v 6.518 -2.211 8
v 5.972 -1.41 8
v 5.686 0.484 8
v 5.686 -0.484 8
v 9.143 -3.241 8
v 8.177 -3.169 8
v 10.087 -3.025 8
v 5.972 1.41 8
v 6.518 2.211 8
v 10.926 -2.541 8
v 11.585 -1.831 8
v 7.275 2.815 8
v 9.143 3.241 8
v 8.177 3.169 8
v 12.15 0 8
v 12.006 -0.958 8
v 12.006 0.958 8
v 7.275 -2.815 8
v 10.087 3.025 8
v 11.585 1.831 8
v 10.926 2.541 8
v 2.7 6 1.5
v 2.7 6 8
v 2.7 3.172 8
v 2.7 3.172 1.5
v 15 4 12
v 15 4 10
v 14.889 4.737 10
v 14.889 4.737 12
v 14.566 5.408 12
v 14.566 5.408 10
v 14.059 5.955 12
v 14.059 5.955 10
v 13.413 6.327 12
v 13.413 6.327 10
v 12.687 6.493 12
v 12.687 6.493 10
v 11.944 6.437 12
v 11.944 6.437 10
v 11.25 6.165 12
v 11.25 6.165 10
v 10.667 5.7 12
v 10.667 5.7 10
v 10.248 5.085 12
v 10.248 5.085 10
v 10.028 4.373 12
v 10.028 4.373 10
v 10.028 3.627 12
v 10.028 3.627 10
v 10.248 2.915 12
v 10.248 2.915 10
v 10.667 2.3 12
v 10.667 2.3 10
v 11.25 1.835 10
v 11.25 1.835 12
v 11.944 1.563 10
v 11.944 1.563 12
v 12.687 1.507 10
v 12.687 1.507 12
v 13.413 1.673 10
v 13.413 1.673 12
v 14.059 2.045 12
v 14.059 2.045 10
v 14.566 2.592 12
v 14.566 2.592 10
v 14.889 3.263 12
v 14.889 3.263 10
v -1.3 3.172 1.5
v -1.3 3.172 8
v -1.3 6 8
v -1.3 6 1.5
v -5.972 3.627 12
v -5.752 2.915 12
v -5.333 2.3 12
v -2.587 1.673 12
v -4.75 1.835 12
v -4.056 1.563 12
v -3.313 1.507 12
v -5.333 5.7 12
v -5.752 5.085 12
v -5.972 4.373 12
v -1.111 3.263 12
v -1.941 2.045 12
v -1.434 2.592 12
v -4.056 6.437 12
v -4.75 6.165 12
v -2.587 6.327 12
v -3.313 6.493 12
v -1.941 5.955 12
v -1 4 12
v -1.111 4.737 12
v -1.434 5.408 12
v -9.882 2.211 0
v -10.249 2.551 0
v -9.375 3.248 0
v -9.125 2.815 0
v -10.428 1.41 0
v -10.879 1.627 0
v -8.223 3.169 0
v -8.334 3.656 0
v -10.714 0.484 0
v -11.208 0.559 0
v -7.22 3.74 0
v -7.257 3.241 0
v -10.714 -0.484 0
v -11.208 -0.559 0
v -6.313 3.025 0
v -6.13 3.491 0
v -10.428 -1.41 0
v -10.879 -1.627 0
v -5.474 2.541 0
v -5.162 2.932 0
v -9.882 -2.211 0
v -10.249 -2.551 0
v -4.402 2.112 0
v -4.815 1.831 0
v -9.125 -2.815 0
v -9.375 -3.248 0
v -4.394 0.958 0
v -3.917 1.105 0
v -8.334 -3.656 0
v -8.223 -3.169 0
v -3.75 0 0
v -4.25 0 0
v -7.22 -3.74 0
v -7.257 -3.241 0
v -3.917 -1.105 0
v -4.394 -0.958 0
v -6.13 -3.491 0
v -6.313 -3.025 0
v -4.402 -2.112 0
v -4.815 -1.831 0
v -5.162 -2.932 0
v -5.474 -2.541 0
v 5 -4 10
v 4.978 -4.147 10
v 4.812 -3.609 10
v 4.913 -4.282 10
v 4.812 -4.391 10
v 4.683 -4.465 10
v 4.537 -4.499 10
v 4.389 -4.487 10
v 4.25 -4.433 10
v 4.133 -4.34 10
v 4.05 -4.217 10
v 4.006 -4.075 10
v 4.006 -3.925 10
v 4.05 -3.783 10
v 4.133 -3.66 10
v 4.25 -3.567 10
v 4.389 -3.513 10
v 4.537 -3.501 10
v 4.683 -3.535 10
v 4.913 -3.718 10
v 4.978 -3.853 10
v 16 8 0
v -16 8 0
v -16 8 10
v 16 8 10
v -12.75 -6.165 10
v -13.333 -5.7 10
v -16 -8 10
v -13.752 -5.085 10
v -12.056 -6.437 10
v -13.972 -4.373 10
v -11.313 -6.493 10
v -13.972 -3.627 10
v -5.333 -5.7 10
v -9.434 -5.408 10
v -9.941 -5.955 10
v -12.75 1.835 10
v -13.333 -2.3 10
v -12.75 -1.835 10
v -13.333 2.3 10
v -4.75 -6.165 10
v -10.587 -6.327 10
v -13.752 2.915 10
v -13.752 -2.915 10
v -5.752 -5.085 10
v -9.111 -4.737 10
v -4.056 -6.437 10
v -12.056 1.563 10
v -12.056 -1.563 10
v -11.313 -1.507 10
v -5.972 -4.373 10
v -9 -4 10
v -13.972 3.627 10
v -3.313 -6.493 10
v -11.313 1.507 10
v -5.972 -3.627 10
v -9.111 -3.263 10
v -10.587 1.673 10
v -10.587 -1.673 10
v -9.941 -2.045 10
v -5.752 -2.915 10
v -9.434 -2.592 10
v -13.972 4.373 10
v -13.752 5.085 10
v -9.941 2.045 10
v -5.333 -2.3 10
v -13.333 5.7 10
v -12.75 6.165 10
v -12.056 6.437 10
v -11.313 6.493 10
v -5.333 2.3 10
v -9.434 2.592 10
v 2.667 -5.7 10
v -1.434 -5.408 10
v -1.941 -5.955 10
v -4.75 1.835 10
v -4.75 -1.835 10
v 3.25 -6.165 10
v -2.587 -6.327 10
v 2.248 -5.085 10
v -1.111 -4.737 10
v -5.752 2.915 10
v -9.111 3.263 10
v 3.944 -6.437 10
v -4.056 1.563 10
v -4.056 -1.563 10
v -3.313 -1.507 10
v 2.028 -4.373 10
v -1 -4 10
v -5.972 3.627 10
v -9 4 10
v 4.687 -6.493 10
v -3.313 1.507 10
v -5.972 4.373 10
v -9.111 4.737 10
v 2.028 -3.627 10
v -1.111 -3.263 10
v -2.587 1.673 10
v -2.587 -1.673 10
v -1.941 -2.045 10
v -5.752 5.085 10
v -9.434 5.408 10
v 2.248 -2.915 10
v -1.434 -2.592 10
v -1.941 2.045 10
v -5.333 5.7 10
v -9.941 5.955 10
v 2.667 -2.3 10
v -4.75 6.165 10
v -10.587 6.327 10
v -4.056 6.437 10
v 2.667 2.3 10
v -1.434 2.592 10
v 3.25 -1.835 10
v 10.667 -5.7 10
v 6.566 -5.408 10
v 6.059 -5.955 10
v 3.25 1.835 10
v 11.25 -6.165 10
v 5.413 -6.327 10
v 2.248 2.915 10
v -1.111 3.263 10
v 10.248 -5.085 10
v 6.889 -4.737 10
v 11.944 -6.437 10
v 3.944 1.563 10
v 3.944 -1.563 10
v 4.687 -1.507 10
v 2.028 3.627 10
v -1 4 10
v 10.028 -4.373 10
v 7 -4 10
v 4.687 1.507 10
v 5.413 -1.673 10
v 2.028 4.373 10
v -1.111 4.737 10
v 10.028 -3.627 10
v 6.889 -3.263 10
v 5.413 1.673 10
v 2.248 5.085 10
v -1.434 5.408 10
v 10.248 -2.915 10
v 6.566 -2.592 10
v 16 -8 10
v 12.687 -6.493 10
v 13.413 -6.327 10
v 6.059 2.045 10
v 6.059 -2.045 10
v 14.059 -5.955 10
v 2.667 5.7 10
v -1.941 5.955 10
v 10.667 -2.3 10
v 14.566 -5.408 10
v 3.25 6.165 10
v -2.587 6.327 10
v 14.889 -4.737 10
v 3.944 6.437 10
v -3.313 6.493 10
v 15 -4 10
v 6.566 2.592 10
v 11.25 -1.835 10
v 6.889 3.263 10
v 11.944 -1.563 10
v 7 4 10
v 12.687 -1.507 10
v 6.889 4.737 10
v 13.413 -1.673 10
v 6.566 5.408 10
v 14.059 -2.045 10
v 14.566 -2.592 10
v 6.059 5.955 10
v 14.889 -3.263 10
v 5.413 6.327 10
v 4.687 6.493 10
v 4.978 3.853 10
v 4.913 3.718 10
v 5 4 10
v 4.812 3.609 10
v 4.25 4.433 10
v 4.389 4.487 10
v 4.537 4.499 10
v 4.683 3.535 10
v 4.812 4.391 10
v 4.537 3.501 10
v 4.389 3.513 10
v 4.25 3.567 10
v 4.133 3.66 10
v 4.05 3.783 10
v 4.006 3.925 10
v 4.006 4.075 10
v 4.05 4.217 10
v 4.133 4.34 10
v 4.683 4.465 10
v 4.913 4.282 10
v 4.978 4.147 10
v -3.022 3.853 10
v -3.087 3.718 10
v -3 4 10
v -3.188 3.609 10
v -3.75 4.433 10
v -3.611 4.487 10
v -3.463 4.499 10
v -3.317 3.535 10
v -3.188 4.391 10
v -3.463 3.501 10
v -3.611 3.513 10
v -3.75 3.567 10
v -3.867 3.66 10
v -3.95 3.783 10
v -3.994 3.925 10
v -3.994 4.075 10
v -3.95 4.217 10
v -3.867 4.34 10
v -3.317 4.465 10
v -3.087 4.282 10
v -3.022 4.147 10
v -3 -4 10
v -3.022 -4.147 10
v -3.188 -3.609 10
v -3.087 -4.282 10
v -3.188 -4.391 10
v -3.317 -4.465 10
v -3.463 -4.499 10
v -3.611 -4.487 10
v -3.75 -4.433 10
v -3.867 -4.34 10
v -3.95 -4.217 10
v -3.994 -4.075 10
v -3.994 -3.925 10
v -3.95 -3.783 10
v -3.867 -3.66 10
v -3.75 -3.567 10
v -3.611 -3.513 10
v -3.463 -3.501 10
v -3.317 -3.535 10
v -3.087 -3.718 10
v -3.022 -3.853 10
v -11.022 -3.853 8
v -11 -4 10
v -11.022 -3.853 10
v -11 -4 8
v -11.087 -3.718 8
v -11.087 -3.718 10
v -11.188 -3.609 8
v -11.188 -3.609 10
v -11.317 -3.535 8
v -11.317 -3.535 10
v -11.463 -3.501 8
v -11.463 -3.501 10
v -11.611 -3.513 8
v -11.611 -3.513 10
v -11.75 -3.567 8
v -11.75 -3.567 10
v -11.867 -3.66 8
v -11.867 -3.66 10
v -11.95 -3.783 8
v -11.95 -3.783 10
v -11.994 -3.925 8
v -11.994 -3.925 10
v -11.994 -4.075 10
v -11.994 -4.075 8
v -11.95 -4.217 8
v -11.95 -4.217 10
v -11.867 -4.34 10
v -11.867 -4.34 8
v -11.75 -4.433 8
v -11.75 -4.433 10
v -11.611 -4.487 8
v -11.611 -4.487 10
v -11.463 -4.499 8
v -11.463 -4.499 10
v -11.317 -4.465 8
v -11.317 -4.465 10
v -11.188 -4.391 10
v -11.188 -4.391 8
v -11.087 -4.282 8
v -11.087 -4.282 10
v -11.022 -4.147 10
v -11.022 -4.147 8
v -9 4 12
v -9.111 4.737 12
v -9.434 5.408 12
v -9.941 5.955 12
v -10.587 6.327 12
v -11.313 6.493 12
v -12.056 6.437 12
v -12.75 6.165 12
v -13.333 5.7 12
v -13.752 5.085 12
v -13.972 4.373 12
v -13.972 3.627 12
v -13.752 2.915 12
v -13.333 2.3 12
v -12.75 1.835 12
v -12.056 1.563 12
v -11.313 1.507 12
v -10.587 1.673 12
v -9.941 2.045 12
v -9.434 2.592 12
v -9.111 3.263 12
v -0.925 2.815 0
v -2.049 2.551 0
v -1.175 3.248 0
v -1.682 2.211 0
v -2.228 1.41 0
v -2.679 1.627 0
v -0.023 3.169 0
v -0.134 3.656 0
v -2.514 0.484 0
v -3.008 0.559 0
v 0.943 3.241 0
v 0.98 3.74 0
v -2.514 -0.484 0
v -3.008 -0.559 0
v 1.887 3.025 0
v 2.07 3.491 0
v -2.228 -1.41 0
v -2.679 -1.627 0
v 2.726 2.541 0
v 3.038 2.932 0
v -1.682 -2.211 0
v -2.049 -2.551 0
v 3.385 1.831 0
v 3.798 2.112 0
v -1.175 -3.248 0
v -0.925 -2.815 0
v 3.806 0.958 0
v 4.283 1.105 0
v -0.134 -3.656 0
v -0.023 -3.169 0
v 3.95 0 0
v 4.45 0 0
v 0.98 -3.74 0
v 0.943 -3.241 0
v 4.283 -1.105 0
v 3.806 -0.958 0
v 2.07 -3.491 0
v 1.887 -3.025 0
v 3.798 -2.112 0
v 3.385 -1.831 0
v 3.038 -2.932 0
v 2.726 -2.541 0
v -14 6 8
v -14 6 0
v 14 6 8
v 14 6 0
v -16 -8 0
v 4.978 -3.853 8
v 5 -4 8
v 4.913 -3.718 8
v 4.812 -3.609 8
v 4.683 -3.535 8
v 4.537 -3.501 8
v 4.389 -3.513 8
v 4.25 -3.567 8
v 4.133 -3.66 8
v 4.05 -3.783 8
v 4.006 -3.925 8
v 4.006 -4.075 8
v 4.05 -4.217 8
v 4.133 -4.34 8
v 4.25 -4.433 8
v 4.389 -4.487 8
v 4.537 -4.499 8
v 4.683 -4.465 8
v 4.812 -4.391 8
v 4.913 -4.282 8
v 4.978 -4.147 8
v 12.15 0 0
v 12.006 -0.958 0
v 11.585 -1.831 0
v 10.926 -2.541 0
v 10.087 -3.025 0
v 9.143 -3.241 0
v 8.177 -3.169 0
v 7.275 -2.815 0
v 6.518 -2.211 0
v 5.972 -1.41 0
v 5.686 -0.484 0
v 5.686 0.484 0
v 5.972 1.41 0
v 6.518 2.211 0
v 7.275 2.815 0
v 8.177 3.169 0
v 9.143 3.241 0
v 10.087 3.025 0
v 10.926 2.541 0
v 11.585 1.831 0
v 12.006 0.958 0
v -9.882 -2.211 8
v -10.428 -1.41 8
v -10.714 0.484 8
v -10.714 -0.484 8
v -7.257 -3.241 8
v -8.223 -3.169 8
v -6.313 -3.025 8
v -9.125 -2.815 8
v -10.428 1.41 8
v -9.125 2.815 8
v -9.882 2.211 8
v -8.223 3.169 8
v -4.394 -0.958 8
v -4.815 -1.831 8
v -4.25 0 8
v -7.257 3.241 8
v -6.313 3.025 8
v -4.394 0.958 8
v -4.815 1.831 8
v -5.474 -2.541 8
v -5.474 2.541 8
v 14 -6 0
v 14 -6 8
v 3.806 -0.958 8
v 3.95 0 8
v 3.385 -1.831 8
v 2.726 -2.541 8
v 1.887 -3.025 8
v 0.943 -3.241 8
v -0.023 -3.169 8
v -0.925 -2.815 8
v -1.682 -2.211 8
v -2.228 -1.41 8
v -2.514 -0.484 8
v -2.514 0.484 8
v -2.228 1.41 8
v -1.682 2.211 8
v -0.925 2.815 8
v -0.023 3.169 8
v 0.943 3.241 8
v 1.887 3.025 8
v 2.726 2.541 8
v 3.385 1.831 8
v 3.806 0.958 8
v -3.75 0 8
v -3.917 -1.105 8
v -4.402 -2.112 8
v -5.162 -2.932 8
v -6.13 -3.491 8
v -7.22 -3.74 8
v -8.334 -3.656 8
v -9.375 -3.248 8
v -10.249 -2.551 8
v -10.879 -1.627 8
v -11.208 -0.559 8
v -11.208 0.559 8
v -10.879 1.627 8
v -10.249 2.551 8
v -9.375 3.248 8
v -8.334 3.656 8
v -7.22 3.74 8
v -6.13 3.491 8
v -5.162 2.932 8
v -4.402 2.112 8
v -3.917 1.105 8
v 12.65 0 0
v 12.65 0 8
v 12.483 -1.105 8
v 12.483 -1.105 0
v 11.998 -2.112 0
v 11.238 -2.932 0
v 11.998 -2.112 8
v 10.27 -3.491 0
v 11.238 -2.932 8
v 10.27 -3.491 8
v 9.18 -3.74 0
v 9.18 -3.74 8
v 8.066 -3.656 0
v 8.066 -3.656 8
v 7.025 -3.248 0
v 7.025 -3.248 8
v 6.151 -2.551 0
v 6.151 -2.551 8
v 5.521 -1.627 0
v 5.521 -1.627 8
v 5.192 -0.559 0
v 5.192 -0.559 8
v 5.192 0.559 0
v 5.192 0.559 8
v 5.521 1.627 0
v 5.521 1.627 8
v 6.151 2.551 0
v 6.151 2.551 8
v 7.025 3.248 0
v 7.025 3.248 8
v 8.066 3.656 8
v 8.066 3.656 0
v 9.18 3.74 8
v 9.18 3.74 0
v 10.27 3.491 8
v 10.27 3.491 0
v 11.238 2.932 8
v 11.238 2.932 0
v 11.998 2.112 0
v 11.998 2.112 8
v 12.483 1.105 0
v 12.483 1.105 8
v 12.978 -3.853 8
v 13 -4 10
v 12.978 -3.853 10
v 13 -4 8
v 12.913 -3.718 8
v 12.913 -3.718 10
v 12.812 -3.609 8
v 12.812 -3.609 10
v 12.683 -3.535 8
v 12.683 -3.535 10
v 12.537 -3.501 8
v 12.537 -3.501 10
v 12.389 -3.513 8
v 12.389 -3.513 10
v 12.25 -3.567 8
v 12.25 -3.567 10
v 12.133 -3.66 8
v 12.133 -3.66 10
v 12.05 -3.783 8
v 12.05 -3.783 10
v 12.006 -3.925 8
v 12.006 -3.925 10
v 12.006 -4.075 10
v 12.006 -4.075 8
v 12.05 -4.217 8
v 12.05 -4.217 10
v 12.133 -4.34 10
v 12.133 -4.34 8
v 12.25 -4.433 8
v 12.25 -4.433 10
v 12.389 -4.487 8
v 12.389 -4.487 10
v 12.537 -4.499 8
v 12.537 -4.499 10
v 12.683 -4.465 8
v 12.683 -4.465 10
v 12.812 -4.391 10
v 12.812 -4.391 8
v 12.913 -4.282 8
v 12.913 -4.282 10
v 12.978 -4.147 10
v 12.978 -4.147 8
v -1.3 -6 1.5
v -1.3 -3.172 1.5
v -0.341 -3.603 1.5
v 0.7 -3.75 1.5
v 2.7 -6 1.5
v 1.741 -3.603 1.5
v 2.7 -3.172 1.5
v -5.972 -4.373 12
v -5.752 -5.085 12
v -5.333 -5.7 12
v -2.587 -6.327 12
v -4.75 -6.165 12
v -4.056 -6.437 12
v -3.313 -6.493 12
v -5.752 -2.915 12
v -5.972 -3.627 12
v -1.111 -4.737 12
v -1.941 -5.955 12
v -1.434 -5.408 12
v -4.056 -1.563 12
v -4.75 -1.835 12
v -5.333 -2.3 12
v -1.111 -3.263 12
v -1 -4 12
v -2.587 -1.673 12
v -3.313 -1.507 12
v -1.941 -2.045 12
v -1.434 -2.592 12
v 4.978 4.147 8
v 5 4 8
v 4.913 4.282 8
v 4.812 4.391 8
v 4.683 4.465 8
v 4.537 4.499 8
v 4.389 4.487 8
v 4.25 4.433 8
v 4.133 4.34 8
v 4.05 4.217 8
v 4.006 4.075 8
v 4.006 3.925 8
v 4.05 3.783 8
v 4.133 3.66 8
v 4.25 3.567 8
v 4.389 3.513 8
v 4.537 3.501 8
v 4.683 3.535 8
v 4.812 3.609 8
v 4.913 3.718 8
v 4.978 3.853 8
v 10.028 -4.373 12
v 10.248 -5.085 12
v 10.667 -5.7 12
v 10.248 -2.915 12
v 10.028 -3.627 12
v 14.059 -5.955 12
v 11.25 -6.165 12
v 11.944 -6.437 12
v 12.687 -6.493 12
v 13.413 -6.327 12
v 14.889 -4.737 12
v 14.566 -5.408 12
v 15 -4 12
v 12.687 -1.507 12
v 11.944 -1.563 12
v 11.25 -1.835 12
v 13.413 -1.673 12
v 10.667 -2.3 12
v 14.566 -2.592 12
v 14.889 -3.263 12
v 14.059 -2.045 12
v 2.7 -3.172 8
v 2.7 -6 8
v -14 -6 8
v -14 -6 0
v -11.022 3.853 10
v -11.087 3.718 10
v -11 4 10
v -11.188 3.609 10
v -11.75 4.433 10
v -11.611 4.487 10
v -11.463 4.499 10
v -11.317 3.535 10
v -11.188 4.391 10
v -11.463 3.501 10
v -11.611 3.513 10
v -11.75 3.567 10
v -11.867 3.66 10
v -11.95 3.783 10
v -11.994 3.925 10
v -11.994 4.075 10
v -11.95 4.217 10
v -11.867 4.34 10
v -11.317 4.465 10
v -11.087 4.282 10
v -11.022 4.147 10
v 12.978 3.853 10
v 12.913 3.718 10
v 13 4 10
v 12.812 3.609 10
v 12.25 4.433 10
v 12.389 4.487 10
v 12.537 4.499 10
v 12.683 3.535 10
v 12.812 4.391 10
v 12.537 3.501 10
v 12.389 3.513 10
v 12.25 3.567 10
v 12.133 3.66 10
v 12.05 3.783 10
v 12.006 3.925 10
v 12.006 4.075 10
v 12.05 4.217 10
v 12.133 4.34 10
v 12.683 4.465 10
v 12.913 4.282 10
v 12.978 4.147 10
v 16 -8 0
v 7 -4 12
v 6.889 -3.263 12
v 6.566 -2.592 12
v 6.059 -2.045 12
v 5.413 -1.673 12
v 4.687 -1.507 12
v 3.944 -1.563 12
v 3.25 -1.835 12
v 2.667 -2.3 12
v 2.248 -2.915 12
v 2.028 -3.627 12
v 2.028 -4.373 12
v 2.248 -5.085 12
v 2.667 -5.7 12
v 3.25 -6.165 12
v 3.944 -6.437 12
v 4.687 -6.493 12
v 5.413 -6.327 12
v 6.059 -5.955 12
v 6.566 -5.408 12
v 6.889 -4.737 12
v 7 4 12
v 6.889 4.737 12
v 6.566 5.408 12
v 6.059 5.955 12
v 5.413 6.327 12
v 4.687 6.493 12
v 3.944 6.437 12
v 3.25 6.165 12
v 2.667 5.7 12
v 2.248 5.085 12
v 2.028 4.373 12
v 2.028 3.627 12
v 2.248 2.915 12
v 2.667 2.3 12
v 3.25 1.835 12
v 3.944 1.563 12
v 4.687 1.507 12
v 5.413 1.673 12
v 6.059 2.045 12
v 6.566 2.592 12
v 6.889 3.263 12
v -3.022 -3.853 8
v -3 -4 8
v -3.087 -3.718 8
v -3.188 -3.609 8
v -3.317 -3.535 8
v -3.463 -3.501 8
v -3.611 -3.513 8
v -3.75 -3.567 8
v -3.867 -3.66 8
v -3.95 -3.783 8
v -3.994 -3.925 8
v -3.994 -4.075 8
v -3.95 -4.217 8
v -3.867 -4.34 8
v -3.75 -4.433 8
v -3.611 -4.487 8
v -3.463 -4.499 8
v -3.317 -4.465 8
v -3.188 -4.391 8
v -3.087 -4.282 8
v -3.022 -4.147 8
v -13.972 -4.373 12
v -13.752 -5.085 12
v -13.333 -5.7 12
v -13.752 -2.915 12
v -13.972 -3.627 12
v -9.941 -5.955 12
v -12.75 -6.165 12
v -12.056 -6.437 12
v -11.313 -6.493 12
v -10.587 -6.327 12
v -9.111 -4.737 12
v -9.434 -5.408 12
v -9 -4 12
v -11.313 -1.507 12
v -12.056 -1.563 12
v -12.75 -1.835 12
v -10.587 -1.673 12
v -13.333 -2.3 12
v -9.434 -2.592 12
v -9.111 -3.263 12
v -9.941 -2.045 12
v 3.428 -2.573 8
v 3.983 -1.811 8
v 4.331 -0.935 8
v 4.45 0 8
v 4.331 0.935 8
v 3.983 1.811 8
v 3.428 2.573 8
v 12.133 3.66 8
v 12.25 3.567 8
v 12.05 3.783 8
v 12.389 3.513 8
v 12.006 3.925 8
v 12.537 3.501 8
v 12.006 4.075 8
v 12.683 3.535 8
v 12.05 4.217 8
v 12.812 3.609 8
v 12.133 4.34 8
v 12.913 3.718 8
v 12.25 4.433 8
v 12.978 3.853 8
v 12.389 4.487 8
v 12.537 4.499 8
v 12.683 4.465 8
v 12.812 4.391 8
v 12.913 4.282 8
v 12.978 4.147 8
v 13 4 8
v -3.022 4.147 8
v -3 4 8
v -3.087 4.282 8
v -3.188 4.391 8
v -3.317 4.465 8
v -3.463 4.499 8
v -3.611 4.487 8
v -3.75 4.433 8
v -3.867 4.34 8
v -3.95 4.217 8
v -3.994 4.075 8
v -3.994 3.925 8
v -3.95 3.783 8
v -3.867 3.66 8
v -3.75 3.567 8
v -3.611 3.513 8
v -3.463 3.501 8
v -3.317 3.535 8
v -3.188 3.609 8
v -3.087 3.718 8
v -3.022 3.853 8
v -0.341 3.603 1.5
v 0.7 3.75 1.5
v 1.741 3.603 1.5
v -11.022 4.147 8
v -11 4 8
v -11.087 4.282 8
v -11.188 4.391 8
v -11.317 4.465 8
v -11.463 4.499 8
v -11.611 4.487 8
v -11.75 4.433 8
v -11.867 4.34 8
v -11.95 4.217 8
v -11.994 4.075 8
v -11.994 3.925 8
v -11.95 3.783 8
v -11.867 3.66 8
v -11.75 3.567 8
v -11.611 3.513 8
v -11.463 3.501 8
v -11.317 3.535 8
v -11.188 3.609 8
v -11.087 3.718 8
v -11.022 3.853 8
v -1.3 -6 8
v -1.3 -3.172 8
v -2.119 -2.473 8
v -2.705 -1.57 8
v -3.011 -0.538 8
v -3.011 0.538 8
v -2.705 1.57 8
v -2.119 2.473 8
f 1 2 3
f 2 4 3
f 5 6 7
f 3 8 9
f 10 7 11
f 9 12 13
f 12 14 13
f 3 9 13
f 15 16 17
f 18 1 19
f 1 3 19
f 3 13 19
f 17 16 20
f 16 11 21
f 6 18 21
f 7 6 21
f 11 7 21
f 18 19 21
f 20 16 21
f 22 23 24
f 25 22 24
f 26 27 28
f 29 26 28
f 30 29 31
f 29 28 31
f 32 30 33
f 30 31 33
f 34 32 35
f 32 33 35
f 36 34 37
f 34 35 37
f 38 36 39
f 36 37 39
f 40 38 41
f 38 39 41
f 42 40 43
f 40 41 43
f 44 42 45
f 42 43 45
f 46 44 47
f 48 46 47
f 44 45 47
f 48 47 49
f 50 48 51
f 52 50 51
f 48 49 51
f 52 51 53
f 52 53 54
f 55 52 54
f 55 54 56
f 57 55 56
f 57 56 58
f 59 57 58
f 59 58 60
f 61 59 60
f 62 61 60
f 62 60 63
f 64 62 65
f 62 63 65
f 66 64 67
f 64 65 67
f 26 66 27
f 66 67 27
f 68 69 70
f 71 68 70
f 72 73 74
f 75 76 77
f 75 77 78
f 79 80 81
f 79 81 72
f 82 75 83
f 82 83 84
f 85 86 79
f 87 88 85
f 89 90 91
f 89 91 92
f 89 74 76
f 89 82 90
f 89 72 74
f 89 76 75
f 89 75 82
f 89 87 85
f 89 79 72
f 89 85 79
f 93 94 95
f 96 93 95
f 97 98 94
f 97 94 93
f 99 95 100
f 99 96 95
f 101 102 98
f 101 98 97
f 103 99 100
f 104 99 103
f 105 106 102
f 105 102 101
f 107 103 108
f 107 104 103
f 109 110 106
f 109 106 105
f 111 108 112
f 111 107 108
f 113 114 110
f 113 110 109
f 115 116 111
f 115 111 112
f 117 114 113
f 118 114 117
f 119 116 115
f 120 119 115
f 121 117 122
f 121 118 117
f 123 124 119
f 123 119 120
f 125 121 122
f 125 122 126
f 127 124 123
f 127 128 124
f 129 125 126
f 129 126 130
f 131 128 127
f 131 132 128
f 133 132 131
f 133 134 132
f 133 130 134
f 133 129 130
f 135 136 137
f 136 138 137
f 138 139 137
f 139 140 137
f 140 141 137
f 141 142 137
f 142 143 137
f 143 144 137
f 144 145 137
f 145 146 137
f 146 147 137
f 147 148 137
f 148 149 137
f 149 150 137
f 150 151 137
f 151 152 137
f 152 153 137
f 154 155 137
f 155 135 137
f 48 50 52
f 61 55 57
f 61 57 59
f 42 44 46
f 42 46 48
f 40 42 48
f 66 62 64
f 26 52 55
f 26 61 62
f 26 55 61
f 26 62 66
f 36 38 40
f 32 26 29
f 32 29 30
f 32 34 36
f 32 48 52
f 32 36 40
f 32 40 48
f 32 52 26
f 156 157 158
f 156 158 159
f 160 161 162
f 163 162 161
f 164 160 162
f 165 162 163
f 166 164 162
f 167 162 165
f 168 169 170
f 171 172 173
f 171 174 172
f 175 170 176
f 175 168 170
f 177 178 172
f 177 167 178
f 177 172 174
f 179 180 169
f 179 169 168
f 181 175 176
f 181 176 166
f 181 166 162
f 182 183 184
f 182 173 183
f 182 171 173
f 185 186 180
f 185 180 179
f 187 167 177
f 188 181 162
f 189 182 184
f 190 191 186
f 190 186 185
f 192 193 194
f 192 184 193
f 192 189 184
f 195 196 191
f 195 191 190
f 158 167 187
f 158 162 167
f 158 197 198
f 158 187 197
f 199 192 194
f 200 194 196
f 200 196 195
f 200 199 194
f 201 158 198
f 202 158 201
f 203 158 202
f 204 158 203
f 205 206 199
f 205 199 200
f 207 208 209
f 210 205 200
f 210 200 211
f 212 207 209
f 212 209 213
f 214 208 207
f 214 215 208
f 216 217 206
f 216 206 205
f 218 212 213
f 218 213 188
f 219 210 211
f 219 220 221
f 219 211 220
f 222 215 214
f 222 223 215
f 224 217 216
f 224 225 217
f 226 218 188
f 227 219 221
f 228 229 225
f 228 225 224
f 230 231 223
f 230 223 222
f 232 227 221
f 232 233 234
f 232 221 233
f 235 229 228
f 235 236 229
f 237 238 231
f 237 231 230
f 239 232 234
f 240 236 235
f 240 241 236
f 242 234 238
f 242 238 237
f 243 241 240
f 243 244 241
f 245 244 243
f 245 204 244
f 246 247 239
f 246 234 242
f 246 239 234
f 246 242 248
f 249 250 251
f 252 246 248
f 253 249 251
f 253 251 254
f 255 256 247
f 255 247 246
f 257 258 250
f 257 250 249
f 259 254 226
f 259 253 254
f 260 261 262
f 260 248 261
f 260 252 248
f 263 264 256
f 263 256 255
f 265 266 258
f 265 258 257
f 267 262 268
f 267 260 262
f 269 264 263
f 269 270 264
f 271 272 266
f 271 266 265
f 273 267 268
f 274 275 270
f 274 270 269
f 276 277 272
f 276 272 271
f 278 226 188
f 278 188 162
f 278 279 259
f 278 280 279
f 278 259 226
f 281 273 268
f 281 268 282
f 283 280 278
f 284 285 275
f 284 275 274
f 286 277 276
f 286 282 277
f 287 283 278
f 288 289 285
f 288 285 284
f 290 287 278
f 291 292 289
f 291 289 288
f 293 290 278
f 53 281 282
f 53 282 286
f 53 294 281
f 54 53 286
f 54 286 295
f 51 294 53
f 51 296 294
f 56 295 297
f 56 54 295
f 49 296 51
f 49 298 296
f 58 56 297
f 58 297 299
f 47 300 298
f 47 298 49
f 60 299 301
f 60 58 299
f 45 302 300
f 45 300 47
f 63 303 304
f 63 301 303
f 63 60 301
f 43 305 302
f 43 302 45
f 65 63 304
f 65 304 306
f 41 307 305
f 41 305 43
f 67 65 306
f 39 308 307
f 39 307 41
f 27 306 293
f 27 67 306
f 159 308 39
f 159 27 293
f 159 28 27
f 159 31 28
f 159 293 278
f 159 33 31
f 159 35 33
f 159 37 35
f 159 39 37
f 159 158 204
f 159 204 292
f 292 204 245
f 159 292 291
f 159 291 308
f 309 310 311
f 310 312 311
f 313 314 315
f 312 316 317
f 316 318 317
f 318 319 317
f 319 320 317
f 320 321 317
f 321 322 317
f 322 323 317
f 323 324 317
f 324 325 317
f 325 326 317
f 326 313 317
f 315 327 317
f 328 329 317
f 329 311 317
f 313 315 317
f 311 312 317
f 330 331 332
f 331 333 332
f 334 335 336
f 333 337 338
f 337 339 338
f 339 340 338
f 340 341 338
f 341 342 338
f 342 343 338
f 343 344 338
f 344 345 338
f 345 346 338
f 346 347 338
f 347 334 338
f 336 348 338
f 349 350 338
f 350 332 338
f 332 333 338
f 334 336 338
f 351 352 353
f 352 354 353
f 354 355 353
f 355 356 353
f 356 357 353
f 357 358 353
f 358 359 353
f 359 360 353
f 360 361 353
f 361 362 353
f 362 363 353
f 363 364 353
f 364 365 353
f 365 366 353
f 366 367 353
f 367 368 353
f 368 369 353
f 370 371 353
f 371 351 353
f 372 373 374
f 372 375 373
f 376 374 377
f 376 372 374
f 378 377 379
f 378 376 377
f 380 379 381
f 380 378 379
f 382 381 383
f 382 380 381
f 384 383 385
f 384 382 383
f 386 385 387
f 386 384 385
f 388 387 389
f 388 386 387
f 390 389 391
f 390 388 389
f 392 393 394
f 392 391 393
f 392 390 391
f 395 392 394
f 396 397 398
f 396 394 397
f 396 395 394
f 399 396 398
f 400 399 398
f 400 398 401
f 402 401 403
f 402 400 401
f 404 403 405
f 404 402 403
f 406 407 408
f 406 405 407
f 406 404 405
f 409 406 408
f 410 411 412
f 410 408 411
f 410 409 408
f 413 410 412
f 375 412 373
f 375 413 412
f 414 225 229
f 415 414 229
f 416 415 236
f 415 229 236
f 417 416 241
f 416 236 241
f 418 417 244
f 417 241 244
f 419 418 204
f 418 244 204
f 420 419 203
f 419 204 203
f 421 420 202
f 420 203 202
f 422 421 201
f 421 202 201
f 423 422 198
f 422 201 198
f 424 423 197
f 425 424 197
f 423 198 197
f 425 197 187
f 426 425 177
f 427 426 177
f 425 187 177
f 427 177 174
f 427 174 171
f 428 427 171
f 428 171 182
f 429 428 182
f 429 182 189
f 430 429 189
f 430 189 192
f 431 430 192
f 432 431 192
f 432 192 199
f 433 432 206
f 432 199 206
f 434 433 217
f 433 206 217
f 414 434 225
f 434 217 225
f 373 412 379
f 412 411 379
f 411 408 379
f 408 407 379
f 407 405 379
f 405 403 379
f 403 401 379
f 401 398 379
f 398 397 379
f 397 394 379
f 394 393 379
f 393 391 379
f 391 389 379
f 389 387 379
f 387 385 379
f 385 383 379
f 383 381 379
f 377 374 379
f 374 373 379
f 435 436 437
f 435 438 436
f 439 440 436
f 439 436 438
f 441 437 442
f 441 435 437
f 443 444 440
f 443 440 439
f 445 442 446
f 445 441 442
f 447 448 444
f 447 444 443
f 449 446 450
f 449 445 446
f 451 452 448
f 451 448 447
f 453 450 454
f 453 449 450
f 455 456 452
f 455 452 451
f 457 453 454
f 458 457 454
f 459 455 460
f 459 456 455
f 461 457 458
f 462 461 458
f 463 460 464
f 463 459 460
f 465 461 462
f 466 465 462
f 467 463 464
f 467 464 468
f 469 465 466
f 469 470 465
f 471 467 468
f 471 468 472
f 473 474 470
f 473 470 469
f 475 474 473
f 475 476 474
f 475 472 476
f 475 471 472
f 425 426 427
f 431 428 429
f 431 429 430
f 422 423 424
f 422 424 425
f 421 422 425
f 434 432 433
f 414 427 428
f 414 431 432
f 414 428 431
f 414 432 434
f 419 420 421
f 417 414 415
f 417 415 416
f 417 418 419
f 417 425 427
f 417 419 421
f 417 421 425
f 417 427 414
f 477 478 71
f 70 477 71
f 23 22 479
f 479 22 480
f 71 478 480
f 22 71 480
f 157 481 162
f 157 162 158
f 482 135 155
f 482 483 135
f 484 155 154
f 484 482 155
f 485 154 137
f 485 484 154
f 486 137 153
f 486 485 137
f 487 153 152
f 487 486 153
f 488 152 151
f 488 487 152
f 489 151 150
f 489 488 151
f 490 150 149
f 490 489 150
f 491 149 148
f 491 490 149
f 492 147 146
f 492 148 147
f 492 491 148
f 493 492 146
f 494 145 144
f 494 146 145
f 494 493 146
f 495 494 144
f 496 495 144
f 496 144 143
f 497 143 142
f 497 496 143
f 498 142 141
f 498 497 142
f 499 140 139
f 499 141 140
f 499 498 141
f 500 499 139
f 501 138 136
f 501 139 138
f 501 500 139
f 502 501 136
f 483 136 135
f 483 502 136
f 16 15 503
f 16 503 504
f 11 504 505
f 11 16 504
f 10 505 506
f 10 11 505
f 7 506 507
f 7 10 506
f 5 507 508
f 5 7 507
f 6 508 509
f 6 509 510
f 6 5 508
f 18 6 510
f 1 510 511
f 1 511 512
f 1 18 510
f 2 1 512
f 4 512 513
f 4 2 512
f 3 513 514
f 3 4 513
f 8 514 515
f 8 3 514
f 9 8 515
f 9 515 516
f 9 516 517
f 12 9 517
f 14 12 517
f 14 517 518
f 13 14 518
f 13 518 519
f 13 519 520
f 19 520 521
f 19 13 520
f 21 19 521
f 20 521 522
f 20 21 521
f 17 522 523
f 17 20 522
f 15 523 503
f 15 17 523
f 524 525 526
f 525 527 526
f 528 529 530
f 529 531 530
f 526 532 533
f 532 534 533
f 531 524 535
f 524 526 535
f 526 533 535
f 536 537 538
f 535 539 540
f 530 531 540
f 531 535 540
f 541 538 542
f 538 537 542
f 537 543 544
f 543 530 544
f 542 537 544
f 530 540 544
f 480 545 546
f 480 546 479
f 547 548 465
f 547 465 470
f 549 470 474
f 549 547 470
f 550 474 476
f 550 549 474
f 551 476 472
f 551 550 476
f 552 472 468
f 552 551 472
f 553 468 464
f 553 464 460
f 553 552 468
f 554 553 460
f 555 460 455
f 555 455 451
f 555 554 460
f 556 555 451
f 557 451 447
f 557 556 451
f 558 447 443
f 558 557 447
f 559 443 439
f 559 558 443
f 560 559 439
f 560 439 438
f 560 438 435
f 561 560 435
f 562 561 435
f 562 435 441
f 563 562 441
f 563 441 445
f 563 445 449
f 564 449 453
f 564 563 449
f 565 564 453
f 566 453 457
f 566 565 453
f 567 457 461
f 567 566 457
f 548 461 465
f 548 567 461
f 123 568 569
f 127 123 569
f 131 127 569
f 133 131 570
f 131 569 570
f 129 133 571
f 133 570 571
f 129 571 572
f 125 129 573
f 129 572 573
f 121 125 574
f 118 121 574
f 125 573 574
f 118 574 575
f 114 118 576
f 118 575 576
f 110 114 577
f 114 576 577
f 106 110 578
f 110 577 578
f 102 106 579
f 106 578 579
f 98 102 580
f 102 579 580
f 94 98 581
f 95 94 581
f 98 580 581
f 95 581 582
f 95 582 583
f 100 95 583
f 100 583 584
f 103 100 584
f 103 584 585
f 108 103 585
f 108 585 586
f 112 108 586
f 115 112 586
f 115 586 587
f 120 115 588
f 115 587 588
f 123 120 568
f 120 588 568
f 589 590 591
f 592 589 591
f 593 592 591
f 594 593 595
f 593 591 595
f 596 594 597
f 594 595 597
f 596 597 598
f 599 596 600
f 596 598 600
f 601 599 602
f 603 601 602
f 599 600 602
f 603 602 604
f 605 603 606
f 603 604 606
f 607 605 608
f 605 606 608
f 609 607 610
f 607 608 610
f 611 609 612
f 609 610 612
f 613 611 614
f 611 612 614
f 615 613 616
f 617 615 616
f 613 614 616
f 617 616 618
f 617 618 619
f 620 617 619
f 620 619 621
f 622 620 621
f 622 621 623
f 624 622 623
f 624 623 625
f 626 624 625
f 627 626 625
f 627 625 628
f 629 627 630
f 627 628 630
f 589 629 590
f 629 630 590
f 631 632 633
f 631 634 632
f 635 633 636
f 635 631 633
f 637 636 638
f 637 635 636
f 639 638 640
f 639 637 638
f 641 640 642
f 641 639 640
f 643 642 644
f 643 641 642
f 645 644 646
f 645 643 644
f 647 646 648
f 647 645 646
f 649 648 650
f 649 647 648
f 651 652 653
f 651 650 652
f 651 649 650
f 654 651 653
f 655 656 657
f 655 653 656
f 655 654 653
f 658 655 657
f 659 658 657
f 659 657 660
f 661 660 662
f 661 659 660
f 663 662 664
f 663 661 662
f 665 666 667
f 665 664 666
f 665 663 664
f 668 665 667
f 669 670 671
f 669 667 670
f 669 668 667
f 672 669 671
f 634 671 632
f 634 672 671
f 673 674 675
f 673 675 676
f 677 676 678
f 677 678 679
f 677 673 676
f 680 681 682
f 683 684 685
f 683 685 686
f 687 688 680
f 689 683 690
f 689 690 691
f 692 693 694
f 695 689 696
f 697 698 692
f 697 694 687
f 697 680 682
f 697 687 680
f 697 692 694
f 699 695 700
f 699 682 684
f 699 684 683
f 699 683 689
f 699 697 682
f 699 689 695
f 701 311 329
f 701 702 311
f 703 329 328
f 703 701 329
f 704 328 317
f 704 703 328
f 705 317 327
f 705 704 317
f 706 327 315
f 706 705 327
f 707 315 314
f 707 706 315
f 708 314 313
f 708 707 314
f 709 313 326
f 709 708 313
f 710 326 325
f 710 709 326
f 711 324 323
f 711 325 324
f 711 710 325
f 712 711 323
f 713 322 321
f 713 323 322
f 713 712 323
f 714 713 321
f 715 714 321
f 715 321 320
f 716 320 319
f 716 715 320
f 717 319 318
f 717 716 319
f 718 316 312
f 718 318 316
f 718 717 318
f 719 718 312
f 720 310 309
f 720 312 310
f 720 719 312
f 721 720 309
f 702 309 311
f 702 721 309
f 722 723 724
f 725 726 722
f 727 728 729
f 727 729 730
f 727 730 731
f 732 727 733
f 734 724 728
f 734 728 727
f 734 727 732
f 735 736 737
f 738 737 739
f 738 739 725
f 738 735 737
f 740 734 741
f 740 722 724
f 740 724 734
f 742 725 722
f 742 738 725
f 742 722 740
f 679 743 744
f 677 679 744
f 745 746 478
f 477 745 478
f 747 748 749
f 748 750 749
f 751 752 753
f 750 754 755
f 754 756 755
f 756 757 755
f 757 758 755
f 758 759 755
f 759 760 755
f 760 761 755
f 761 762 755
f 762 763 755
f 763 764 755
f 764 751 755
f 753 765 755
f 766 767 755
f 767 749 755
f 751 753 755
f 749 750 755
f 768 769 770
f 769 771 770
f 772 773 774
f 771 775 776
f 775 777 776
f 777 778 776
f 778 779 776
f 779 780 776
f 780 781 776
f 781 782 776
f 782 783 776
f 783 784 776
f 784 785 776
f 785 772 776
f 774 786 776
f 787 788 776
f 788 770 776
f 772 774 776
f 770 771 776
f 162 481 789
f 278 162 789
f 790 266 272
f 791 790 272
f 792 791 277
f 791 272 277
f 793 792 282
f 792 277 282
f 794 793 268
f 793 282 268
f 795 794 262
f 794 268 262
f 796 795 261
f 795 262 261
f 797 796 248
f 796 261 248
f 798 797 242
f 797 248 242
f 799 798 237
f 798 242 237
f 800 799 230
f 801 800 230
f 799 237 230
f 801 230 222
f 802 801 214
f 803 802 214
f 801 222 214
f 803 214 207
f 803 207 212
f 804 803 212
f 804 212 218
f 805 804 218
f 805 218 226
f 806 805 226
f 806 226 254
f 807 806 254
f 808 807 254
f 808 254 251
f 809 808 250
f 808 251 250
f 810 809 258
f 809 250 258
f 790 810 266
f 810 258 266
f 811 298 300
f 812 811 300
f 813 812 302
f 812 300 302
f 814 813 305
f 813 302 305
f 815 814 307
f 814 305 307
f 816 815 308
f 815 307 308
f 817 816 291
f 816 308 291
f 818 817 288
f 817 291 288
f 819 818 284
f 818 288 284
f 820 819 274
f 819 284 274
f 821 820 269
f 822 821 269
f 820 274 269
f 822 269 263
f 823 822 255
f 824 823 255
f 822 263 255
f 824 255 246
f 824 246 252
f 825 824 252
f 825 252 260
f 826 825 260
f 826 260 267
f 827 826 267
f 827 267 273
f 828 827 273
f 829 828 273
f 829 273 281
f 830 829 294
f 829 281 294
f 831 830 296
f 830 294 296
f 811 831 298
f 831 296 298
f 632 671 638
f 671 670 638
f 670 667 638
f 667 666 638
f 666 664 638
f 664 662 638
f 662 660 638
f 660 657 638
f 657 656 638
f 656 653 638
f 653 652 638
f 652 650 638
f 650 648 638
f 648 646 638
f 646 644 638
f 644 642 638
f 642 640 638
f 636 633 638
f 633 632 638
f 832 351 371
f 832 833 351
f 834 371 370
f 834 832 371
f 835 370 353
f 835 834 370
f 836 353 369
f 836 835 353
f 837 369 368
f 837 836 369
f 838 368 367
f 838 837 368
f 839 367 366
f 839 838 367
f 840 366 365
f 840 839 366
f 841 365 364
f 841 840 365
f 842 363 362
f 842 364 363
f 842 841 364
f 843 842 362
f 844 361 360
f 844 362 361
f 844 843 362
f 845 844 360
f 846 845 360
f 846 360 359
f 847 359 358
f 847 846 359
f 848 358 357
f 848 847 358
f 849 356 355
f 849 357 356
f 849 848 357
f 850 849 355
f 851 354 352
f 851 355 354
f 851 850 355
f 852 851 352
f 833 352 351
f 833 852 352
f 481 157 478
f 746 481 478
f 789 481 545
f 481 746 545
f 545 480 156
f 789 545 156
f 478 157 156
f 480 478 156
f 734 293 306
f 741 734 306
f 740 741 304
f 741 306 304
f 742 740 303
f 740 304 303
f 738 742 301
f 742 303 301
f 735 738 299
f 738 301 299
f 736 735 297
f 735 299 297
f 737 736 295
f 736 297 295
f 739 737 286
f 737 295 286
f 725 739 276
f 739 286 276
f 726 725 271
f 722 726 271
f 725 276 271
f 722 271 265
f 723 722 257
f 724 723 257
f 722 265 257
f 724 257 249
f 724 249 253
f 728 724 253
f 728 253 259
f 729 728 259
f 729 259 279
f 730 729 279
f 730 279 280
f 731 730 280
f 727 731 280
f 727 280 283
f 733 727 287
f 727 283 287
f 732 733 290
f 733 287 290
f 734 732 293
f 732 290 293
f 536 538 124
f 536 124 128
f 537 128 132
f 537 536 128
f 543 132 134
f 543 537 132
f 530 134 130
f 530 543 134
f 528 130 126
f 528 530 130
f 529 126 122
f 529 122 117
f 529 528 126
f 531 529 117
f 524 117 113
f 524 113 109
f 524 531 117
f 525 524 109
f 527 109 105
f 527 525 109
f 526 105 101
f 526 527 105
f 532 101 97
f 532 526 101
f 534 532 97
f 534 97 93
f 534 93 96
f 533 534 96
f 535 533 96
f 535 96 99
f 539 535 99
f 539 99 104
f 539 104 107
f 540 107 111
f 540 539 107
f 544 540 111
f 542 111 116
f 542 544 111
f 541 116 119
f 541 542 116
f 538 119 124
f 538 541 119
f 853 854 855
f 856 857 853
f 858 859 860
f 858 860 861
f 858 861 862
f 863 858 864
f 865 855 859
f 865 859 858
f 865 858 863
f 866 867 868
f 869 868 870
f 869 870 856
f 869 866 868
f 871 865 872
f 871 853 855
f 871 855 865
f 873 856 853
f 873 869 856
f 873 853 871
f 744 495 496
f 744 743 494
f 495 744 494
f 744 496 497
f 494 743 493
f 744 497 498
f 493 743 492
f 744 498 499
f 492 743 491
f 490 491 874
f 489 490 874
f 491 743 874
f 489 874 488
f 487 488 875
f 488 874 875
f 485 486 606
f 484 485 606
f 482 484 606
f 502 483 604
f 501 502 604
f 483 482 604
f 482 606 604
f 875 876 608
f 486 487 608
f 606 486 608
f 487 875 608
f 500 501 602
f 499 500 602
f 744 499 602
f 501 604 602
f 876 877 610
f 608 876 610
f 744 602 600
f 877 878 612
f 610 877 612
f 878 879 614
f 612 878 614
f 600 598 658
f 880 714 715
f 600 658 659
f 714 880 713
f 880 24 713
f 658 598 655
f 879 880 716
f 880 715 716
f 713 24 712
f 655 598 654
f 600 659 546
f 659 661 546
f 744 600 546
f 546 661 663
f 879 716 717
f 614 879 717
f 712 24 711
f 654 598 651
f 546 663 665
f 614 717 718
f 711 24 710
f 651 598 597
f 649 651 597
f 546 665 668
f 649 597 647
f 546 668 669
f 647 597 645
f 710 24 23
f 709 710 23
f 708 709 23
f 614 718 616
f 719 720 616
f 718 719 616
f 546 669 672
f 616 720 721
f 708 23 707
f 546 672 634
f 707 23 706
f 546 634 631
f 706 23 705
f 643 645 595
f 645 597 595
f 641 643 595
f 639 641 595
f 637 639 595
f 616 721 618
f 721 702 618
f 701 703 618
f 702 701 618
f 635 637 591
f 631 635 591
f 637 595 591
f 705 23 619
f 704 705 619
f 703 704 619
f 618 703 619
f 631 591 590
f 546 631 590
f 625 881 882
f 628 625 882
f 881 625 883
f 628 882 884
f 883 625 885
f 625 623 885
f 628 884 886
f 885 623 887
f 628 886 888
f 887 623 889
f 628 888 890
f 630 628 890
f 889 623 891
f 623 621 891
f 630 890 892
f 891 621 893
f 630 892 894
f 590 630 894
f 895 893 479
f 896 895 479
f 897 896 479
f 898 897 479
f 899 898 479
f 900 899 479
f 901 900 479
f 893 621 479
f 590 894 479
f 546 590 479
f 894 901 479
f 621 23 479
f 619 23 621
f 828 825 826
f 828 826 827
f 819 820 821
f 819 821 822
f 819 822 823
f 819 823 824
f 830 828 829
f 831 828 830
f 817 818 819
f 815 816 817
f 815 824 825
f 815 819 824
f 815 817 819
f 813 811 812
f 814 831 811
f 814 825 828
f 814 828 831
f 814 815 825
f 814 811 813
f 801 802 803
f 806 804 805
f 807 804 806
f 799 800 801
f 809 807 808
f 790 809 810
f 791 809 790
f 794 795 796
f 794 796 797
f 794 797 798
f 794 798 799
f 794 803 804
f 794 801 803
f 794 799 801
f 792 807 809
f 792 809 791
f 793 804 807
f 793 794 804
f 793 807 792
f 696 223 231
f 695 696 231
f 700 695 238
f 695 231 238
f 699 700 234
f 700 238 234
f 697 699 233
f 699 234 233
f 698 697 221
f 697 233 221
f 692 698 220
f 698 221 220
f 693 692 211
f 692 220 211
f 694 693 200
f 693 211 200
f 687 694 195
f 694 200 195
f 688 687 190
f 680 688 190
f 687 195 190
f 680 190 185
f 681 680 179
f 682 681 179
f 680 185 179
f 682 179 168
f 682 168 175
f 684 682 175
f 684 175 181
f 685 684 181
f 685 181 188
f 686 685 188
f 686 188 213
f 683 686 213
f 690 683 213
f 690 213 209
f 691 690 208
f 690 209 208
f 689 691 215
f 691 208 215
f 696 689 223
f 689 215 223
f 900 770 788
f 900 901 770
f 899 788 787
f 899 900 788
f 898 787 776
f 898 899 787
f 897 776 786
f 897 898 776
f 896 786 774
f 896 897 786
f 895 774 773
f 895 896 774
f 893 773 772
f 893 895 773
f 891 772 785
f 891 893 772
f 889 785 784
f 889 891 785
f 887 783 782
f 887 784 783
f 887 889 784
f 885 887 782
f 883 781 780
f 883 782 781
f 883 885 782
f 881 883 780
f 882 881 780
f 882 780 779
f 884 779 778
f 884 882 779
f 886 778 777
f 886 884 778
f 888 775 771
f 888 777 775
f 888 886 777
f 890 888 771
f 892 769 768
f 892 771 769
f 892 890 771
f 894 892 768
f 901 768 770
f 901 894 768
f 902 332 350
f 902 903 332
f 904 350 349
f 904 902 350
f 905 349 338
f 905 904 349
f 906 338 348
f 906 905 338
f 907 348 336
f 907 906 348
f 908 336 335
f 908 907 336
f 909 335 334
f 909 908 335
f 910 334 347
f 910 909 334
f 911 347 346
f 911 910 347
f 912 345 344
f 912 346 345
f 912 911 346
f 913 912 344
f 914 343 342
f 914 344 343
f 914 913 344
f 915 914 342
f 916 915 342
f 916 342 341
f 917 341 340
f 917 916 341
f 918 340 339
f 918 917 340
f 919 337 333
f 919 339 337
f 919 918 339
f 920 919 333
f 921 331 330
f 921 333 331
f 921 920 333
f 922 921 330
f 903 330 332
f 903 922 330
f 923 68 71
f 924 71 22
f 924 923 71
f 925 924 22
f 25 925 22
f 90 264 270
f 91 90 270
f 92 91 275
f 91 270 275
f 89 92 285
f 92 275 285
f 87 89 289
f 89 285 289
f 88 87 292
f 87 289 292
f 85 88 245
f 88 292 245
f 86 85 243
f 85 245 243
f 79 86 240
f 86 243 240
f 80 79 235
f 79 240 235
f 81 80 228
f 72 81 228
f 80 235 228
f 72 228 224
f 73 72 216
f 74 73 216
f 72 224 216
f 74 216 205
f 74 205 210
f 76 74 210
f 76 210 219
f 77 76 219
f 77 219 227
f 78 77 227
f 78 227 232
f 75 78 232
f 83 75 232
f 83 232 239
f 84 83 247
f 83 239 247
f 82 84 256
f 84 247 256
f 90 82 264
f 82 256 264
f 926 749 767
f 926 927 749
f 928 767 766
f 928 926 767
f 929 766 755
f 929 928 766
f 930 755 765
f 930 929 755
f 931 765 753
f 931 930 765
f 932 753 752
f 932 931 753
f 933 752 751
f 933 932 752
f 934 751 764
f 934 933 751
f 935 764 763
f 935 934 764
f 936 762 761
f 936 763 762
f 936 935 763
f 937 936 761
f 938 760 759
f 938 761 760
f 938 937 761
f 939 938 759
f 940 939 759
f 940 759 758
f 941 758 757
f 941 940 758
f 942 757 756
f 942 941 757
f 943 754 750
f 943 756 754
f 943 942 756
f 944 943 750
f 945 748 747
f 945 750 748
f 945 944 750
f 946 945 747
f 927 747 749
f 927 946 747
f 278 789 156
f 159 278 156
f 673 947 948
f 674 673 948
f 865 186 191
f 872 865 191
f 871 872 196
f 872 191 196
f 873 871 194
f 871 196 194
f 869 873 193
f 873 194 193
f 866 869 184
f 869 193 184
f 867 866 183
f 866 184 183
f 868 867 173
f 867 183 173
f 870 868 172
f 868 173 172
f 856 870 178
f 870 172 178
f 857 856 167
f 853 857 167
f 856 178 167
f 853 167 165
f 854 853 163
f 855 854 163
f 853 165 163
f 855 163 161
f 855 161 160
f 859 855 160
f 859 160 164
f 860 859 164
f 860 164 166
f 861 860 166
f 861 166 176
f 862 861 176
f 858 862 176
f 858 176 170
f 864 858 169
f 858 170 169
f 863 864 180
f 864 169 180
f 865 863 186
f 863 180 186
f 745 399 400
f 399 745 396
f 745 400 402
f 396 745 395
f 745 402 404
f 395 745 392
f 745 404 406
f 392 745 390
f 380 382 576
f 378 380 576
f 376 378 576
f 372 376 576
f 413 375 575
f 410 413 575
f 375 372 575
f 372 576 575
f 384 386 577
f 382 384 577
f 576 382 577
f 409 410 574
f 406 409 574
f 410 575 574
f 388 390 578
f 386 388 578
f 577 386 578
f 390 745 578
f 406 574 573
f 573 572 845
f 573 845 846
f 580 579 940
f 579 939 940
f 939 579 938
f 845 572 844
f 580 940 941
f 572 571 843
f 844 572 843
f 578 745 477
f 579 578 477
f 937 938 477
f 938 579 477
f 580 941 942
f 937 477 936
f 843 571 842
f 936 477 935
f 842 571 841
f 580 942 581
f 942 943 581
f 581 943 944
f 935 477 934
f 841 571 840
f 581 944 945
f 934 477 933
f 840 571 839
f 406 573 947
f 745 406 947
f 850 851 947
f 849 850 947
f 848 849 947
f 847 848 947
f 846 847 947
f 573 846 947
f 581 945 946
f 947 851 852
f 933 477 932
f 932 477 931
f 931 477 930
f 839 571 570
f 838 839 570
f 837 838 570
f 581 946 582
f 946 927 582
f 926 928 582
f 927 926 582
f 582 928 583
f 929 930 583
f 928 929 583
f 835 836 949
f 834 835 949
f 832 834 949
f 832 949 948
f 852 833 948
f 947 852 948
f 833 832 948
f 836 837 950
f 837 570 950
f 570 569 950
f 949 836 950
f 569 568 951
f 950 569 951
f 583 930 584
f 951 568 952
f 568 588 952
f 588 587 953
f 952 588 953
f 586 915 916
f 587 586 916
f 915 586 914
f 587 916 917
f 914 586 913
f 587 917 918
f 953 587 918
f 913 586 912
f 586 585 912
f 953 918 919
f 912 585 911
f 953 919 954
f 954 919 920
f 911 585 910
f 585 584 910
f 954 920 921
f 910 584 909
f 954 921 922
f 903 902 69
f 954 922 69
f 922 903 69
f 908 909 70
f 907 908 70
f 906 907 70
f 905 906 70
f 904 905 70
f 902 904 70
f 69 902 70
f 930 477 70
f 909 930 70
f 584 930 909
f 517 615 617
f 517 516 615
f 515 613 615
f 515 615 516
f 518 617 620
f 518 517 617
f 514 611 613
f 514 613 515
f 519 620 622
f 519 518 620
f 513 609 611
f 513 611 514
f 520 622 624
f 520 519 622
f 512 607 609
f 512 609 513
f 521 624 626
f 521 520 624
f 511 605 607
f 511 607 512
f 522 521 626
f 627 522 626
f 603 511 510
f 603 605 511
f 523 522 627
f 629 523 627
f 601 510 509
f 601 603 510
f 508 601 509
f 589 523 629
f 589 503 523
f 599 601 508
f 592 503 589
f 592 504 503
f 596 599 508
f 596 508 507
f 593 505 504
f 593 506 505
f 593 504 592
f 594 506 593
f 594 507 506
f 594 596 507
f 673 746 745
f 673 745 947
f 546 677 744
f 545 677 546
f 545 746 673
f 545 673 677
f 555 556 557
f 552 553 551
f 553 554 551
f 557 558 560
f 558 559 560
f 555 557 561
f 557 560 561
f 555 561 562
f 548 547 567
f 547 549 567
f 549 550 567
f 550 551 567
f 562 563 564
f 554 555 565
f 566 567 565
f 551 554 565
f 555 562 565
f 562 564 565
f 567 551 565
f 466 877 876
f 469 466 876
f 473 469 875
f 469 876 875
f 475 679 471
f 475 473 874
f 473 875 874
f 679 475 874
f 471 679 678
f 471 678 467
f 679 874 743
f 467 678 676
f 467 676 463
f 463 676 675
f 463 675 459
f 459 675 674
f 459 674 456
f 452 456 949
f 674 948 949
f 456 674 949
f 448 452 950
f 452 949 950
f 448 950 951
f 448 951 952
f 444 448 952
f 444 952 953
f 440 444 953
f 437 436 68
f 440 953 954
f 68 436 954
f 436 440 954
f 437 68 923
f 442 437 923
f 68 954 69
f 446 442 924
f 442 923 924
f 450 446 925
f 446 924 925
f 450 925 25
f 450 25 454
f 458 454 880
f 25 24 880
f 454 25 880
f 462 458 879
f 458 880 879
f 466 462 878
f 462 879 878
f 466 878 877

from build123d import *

# Parameters (mm, degrees)
F0_W     = 32
F0_H     = 16
F1_DEPTH = 10
F2_R     = 2.5
F3_DEPTH = 2
F4_T     = -2
F5_R     = 3.75
F5_R_2   = 3.25
F6_DEPTH = 8
F8_DEPTH = 6.5


with BuildPart() as f1:
    # F0 (on Top) → F1 (new body)
    with BuildSketch(Plane.XY):
        Rectangle(F0_W, F0_H)
    extrude(amount=F1_DEPTH)

    # F2 (on face) → F3 (join)
    with BuildSketch(Plane.XY.offset(10)):
        with Locations((-11.5, 4)):
            Circle(F2_R)
        with Locations((-3.5, 4)):
            Circle(F2_R)
        with Locations((12.5, 4)):
            Circle(F2_R)
        with Locations((12.5, -4)):
            Circle(F2_R)
        with Locations((4.5, -4)):
            Circle(F2_R)
        with Locations((-3.5, -4)):
            Circle(F2_R)
        with Locations((-11.5, -4)):
            Circle(F2_R)
        with Locations((4.5, 4)):
            Circle(F2_R)
    extrude(amount=F3_DEPTH)

    # F4
    f4_openings = [f1.faces().sort_by_distance(p)[0] for p in [
        (0, 0, 0),
    ]]
    offset(amount=F4_T, openings=f4_openings, kind=Kind.INTERSECTION)

    # F5 (on face) → F6 (join, through all)
    with BuildSketch(Plane(origin=(0, 0, 8), x_dir=(1, 0, 0), z_dir=(0, 0, -1))):
        with Locations((-7.5, 0)):
            Circle(F5_R)
        with Locations((-7.5, 0)):
            Circle(F5_R_2, mode=Mode.SUBTRACT)
        with Locations((0.7, 0)):
            Circle(F5_R)
        with Locations((0.7, 0)):
            Circle(F5_R_2, mode=Mode.SUBTRACT)
        with Locations((8.9, 0)):
            Circle(F5_R)
        with Locations((8.9, 0)):
            Circle(F5_R_2, mode=Mode.SUBTRACT)
    extrude(amount=F6_DEPTH)

    # F7 (on face) → F8 (join)
    with BuildSketch(Plane(origin=(0, 0, 8), x_dir=(1, 0, 0), z_dir=(0, 0, -1))):
        with BuildLine():
            ThreePointArc((-1.3, 3.1721443851), (0.7, 3.75), (2.7, 3.1721443851))
            Line((2.7, 3.1721443851), (2.7, 6))
            Line((2.7, 6), (-1.3, 6))
            Line((-1.3, 6), (-1.3, 3.1721443851))
        make_face()
        with BuildLine():
            Line((2.7, -6), (2.7, -3.1721443851))
            ThreePointArc((2.7, -3.1721443851), (0.7, -3.75), (-1.3, -3.1721443851))
            Line((-1.3, -3.1721443851), (-1.3, -6))
            Line((-1.3, -6), (2.7, -6))
        make_face()
    extrude(amount=F8_DEPTH)


solid = f1.part
